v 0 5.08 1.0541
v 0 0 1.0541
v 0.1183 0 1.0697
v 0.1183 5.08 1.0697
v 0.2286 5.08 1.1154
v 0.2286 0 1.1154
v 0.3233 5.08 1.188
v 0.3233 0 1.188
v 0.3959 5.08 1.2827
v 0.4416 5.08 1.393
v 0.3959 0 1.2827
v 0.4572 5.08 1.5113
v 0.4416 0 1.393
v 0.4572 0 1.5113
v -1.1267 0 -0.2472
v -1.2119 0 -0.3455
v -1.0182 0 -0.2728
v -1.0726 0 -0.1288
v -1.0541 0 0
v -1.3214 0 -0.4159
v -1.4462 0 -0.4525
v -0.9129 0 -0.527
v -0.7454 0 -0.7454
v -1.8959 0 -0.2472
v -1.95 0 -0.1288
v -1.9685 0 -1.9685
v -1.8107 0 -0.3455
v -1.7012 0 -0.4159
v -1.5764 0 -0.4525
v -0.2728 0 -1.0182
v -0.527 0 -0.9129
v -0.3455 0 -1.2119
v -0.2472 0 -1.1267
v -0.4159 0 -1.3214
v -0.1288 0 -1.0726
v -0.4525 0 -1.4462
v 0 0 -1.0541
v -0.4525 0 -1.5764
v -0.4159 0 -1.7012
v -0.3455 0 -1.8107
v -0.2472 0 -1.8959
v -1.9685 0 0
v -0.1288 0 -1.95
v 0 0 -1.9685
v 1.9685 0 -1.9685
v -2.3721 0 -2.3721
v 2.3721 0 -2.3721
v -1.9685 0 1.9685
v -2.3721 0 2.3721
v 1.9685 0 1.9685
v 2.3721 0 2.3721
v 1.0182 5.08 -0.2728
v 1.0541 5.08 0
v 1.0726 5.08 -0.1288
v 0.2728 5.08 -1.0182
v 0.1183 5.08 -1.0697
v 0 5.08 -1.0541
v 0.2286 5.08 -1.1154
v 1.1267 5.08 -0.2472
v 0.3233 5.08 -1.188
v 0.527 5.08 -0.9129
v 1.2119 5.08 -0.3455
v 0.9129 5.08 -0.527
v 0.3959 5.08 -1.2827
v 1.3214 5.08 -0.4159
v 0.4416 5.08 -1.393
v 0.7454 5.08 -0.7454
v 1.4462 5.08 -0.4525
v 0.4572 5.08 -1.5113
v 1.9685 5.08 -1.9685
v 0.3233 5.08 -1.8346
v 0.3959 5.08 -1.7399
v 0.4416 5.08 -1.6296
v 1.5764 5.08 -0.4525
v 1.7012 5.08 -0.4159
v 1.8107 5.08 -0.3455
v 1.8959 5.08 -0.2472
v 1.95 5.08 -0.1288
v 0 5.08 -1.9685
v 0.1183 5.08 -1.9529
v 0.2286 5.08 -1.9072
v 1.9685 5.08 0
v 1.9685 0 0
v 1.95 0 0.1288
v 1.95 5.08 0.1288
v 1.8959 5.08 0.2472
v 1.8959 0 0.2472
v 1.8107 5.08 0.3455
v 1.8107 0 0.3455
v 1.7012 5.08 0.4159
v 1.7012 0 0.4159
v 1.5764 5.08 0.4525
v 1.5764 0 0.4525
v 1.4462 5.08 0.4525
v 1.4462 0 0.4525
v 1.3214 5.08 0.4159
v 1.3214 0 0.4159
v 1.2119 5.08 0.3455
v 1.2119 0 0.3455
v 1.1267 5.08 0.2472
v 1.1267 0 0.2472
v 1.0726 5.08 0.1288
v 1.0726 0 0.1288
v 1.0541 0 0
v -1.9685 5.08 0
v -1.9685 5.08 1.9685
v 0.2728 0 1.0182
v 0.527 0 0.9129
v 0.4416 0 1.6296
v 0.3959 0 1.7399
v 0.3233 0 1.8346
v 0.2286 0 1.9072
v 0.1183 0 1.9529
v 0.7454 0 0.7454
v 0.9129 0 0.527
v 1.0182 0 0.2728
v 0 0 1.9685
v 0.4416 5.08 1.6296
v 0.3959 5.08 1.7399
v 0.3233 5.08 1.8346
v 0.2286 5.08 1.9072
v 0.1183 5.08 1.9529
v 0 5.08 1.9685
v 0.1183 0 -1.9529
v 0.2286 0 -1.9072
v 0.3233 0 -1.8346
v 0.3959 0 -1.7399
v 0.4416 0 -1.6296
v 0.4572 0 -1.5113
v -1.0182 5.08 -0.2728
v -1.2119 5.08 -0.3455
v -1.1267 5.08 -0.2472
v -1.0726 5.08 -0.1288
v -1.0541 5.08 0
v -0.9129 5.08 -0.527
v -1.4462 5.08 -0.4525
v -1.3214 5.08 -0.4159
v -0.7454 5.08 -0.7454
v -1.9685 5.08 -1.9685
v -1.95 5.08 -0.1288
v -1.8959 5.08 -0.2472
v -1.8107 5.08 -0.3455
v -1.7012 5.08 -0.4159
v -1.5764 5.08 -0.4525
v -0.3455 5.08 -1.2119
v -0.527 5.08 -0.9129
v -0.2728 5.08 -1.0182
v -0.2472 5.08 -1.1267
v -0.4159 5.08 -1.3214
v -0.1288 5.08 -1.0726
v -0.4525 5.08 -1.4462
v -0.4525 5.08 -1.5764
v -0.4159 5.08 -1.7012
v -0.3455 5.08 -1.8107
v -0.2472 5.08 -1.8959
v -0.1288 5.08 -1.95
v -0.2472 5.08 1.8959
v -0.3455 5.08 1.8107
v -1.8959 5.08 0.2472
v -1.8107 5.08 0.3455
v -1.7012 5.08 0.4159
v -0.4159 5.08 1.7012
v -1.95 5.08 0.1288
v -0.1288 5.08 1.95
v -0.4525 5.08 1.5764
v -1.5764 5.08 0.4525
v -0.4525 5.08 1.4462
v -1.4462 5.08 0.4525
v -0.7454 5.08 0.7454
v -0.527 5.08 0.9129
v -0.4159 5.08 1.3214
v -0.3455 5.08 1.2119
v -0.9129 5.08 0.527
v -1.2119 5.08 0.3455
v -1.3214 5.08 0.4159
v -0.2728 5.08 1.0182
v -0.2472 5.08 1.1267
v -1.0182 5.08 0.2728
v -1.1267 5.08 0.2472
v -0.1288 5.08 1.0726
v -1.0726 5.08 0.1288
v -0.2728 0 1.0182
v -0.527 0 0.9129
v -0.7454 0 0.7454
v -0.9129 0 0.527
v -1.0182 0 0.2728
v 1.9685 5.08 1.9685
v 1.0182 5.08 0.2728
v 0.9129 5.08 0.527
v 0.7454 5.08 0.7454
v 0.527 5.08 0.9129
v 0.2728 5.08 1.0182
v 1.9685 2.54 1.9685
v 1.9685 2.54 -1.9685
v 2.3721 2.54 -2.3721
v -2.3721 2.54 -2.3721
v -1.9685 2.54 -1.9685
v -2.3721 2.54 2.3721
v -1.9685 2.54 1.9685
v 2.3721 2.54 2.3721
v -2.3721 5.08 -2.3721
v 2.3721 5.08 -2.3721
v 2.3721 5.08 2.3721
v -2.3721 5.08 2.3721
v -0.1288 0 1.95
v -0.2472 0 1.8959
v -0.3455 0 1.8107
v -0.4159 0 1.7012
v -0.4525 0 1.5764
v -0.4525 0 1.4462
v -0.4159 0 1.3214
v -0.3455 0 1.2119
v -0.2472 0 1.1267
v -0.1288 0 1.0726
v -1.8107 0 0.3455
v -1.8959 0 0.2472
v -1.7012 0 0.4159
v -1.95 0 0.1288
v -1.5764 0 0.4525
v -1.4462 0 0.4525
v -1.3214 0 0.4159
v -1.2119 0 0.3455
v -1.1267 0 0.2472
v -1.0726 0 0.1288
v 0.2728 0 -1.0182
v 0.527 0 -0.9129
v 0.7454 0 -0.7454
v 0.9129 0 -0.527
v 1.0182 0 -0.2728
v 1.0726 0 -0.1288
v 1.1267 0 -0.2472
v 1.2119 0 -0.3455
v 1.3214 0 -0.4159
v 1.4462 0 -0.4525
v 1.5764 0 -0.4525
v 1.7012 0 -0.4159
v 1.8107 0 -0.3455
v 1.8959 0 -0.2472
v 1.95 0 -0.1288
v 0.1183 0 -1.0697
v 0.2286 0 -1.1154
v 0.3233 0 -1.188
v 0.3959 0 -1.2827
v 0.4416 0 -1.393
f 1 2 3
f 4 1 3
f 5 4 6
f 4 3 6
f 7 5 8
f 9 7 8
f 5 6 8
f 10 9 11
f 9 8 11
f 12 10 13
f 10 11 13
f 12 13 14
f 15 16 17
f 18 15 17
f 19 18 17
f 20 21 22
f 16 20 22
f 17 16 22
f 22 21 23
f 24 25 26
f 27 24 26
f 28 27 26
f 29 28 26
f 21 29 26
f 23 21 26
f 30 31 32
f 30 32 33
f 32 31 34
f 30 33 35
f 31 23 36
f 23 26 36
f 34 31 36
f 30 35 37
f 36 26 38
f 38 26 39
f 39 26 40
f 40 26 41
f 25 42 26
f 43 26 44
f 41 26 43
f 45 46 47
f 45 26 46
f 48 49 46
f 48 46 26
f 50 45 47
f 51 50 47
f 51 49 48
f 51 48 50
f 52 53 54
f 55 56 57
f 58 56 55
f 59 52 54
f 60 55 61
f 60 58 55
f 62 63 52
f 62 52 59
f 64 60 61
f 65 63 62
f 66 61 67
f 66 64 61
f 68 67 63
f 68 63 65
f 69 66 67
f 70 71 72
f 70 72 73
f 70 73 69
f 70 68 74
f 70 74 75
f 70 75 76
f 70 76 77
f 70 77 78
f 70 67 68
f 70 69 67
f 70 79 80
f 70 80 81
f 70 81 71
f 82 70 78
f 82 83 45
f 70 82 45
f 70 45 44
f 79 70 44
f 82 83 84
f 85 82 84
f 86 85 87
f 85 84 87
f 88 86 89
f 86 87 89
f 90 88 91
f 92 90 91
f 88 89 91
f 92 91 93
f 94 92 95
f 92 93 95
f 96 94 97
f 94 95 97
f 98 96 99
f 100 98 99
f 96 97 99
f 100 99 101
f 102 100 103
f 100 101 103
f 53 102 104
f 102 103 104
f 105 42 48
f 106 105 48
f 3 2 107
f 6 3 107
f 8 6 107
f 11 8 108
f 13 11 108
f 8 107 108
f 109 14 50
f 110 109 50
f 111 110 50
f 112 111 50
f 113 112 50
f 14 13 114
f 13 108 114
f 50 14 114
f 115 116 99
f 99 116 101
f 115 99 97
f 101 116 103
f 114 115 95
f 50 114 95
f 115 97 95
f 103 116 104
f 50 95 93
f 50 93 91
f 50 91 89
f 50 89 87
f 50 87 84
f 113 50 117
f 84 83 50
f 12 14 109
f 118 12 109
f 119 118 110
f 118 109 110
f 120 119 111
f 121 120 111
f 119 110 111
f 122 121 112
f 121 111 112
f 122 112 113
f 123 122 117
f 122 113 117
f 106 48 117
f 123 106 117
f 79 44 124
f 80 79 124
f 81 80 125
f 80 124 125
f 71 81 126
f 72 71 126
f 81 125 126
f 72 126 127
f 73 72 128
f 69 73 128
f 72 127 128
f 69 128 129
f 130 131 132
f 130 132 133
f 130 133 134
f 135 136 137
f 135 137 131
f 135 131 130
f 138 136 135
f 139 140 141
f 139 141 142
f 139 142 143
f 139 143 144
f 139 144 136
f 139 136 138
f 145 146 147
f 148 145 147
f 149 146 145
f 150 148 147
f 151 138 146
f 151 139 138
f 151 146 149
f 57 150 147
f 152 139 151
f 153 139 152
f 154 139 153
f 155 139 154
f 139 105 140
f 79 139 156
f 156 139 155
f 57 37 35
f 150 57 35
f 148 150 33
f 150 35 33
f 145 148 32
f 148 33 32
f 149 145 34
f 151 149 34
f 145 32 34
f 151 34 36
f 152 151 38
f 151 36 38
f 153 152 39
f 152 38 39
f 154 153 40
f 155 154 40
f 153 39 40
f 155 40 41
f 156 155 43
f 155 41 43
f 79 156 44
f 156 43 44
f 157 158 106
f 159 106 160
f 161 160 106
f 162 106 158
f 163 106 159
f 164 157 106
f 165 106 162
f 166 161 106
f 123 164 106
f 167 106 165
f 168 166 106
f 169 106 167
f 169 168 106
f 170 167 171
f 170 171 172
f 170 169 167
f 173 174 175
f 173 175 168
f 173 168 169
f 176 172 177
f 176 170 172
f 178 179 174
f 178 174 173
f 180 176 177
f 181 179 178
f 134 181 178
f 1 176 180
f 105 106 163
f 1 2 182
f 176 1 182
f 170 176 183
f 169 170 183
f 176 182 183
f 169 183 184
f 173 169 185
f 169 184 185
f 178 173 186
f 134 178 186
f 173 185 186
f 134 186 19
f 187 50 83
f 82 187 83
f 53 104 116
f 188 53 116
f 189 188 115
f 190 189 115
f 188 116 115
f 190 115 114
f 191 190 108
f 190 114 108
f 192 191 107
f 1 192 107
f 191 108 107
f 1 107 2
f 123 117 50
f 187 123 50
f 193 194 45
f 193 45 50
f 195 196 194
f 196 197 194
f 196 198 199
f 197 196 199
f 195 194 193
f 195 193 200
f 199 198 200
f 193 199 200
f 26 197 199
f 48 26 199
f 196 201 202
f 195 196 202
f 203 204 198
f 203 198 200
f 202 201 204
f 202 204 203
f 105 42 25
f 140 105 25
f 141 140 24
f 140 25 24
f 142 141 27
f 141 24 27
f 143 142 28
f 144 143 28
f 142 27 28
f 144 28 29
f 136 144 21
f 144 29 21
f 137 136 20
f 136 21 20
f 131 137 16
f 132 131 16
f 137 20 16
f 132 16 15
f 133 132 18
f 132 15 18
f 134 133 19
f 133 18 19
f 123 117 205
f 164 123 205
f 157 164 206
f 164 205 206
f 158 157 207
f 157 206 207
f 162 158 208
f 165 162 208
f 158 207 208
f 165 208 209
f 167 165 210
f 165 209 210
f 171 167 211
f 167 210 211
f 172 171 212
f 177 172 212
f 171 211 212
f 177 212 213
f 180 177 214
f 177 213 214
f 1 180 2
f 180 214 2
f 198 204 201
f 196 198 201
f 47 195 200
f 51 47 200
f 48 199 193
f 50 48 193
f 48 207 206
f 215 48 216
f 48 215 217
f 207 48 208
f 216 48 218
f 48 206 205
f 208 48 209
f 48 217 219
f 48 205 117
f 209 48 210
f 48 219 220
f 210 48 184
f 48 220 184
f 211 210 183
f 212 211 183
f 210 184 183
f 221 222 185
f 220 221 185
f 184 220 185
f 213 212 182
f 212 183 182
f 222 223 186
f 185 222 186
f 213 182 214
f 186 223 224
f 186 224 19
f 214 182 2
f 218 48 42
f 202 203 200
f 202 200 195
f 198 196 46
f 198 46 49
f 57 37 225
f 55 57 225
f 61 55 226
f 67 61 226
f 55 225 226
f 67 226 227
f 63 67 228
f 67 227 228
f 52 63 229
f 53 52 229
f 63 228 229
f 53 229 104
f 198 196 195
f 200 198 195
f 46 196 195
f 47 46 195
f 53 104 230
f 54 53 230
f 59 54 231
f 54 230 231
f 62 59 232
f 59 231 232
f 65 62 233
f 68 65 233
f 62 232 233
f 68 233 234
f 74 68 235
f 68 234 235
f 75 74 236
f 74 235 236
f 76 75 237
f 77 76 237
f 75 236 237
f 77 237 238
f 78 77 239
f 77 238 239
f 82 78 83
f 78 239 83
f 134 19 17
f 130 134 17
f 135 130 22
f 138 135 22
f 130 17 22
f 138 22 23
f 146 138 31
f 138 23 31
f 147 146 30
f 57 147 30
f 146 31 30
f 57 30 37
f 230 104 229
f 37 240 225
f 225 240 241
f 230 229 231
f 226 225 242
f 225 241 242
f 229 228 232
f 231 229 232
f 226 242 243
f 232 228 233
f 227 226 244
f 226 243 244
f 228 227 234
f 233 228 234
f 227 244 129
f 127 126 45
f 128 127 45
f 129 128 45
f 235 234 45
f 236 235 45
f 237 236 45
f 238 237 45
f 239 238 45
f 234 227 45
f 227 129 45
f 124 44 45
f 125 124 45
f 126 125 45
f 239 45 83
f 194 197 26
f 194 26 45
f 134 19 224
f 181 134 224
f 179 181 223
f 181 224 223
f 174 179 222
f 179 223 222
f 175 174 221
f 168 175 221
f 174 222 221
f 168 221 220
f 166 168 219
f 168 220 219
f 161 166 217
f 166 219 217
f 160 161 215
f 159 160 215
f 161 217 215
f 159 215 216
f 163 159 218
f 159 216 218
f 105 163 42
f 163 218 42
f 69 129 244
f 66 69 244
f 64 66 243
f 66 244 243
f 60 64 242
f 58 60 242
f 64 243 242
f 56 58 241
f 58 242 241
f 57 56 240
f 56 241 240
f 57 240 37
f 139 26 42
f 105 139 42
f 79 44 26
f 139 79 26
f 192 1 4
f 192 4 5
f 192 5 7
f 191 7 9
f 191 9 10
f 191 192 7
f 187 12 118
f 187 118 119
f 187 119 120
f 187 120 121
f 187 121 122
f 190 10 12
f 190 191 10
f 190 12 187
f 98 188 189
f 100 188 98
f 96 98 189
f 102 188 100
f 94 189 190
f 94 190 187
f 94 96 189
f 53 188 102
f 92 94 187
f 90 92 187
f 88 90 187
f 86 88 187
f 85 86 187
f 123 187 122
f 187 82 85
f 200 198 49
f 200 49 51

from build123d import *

# Parameters (mm, degrees)
BOSS_EXTRUDE1_DEPTH   = 5.08
BOSS_EXTRUDE1_2_DEPTH = 5.08
BOSS_EXTRUDE1_3_DEPTH = 5.08
BOSS_EXTRUDE1_4_DEPTH = 5.08
SKETCH2_W             = 4.744123862
SKETCH2_H             = 4.744123862
BOSS_EXTRUDE10_DEPTH  = 2.54
SKETCH3_W             = 4.744123862
SKETCH3_H             = 4.744123862
SKETCH3_W_2           = 3.937
SKETCH3_H_2           = 3.937
BOSS_EXTRUDE13_DEPTH  = 2.54


with BuildPart() as part:
    # Sketch1 → Boss-Extrude1 (new body)
    with BuildSketch(Plane(origin=(0, 0, 0), x_dir=(1, 0, 0), z_dir=(0, 1, 0))):
        with BuildLine():
            Line((-1.9685, 1.9685), (-1.9685, 0))
            ThreePointArc((-1.9685, 0), (-1.5113, 0.4572), (-1.0541, 0))
            ThreePointArc((-1.0541, 0), (-0.745361258, 0.745361258), (0, 1.0541))
            ThreePointArc((0, 1.0541), (-0.4572, 1.5113), (0, 1.9685))
            Line((0, 1.9685), (-1.9685, 1.9685))
        make_face()
    extrude(amount=BOSS_EXTRUDE1_DEPTH)


with BuildPart() as body_2:
    # Sketch1 → Boss-Extrude1 2 (new body)
    with BuildSketch(Plane(origin=(0, 0, 0), x_dir=(1, 0, 0), z_dir=(0, 1, 0))):
        with BuildLine():
            Line((1.9685, 1.9685), (0, 1.9685))
            ThreePointArc((0, 1.9685), (0.32328922, 1.83458922), (0.4572, 1.5113))
            ThreePointArc((0.4572, 1.5113), (0.32328922, 1.18801078), (0, 1.0541))
            ThreePointArc((0, 1.0541), (0.745361258, 0.745361258), (1.0541, 0))
            ThreePointArc((1.0541, 0), (1.5113, 0.4572), (1.9685, 0))
            Line((1.9685, 0), (1.9685, 1.9685))
        make_face()
    extrude(amount=BOSS_EXTRUDE1_2_DEPTH)


with BuildPart() as body_3:
    # Sketch1 → Boss-Extrude1 3 (new body)
    with BuildSketch(Plane(origin=(0, 0, 0), x_dir=(1, 0, 0), z_dir=(0, 1, 0))):
        with BuildLine():
            ThreePointArc((0.4572, -1.5113), (0.32328922, -1.83458922), (0, -1.9685))
            Line((0, -1.9685), (1.9685, -1.9685))
            Line((1.9685, -1.9685), (1.9685, 0))
            ThreePointArc((1.9685, 0), (1.5113, -0.4572), (1.0541, 0))
            ThreePointArc((1.0541, 0), (0.745361258, -0.745361258), (0, -1.0541))
            ThreePointArc((0, -1.0541), (0.32328922, -1.18801078), (0.4572, -1.5113))
        make_face()
    extrude(amount=BOSS_EXTRUDE1_3_DEPTH)


with BuildPart() as body_4:
    # Sketch1 → Boss-Extrude1 4 (new body)
    with BuildSketch(Plane(origin=(0, 0, 0), x_dir=(1, 0, 0), z_dir=(0, 1, 0))):
        with BuildLine():
            ThreePointArc((-1.0541, 0), (-1.5113, -0.4572), (-1.9685, 0))
            Line((-1.9685, 0), (-1.9685, -1.9685))
            Line((-1.9685, -1.9685), (0, -1.9685))
            ThreePointArc((0, -1.9685), (-0.4572, -1.5113), (0, -1.0541))
            ThreePointArc((0, -1.0541), (-0.745361258, -0.745361258), (-1.0541, 0))
        make_face()
    extrude(amount=BOSS_EXTRUDE1_4_DEPTH)


with BuildPart() as body_5:
    # Sketch2 → Boss-Extrude10 (new body)
    with BuildSketch(Plane(origin=(0, 5.08, 0), x_dir=(1, 0, 0), z_dir=(0, 1, 0))):
        Rectangle(SKETCH2_W, SKETCH2_H)
    extrude(amount=-BOSS_EXTRUDE10_DEPTH)


with BuildPart() as body_6:
    # Sketch3 → Boss-Extrude13 (new body)
    with BuildSketch(Plane.XZ.offset(-2.54)):
        Rectangle(SKETCH3_W, SKETCH3_H)
        Rectangle(SKETCH3_W_2, SKETCH3_H_2, mode=Mode.SUBTRACT)
    extrude(amount=BOSS_EXTRUDE13_DEPTH)


solid = Compound([part.part, body_2.part, body_3.part, body_4.part, body_5.part, body_6.part])
